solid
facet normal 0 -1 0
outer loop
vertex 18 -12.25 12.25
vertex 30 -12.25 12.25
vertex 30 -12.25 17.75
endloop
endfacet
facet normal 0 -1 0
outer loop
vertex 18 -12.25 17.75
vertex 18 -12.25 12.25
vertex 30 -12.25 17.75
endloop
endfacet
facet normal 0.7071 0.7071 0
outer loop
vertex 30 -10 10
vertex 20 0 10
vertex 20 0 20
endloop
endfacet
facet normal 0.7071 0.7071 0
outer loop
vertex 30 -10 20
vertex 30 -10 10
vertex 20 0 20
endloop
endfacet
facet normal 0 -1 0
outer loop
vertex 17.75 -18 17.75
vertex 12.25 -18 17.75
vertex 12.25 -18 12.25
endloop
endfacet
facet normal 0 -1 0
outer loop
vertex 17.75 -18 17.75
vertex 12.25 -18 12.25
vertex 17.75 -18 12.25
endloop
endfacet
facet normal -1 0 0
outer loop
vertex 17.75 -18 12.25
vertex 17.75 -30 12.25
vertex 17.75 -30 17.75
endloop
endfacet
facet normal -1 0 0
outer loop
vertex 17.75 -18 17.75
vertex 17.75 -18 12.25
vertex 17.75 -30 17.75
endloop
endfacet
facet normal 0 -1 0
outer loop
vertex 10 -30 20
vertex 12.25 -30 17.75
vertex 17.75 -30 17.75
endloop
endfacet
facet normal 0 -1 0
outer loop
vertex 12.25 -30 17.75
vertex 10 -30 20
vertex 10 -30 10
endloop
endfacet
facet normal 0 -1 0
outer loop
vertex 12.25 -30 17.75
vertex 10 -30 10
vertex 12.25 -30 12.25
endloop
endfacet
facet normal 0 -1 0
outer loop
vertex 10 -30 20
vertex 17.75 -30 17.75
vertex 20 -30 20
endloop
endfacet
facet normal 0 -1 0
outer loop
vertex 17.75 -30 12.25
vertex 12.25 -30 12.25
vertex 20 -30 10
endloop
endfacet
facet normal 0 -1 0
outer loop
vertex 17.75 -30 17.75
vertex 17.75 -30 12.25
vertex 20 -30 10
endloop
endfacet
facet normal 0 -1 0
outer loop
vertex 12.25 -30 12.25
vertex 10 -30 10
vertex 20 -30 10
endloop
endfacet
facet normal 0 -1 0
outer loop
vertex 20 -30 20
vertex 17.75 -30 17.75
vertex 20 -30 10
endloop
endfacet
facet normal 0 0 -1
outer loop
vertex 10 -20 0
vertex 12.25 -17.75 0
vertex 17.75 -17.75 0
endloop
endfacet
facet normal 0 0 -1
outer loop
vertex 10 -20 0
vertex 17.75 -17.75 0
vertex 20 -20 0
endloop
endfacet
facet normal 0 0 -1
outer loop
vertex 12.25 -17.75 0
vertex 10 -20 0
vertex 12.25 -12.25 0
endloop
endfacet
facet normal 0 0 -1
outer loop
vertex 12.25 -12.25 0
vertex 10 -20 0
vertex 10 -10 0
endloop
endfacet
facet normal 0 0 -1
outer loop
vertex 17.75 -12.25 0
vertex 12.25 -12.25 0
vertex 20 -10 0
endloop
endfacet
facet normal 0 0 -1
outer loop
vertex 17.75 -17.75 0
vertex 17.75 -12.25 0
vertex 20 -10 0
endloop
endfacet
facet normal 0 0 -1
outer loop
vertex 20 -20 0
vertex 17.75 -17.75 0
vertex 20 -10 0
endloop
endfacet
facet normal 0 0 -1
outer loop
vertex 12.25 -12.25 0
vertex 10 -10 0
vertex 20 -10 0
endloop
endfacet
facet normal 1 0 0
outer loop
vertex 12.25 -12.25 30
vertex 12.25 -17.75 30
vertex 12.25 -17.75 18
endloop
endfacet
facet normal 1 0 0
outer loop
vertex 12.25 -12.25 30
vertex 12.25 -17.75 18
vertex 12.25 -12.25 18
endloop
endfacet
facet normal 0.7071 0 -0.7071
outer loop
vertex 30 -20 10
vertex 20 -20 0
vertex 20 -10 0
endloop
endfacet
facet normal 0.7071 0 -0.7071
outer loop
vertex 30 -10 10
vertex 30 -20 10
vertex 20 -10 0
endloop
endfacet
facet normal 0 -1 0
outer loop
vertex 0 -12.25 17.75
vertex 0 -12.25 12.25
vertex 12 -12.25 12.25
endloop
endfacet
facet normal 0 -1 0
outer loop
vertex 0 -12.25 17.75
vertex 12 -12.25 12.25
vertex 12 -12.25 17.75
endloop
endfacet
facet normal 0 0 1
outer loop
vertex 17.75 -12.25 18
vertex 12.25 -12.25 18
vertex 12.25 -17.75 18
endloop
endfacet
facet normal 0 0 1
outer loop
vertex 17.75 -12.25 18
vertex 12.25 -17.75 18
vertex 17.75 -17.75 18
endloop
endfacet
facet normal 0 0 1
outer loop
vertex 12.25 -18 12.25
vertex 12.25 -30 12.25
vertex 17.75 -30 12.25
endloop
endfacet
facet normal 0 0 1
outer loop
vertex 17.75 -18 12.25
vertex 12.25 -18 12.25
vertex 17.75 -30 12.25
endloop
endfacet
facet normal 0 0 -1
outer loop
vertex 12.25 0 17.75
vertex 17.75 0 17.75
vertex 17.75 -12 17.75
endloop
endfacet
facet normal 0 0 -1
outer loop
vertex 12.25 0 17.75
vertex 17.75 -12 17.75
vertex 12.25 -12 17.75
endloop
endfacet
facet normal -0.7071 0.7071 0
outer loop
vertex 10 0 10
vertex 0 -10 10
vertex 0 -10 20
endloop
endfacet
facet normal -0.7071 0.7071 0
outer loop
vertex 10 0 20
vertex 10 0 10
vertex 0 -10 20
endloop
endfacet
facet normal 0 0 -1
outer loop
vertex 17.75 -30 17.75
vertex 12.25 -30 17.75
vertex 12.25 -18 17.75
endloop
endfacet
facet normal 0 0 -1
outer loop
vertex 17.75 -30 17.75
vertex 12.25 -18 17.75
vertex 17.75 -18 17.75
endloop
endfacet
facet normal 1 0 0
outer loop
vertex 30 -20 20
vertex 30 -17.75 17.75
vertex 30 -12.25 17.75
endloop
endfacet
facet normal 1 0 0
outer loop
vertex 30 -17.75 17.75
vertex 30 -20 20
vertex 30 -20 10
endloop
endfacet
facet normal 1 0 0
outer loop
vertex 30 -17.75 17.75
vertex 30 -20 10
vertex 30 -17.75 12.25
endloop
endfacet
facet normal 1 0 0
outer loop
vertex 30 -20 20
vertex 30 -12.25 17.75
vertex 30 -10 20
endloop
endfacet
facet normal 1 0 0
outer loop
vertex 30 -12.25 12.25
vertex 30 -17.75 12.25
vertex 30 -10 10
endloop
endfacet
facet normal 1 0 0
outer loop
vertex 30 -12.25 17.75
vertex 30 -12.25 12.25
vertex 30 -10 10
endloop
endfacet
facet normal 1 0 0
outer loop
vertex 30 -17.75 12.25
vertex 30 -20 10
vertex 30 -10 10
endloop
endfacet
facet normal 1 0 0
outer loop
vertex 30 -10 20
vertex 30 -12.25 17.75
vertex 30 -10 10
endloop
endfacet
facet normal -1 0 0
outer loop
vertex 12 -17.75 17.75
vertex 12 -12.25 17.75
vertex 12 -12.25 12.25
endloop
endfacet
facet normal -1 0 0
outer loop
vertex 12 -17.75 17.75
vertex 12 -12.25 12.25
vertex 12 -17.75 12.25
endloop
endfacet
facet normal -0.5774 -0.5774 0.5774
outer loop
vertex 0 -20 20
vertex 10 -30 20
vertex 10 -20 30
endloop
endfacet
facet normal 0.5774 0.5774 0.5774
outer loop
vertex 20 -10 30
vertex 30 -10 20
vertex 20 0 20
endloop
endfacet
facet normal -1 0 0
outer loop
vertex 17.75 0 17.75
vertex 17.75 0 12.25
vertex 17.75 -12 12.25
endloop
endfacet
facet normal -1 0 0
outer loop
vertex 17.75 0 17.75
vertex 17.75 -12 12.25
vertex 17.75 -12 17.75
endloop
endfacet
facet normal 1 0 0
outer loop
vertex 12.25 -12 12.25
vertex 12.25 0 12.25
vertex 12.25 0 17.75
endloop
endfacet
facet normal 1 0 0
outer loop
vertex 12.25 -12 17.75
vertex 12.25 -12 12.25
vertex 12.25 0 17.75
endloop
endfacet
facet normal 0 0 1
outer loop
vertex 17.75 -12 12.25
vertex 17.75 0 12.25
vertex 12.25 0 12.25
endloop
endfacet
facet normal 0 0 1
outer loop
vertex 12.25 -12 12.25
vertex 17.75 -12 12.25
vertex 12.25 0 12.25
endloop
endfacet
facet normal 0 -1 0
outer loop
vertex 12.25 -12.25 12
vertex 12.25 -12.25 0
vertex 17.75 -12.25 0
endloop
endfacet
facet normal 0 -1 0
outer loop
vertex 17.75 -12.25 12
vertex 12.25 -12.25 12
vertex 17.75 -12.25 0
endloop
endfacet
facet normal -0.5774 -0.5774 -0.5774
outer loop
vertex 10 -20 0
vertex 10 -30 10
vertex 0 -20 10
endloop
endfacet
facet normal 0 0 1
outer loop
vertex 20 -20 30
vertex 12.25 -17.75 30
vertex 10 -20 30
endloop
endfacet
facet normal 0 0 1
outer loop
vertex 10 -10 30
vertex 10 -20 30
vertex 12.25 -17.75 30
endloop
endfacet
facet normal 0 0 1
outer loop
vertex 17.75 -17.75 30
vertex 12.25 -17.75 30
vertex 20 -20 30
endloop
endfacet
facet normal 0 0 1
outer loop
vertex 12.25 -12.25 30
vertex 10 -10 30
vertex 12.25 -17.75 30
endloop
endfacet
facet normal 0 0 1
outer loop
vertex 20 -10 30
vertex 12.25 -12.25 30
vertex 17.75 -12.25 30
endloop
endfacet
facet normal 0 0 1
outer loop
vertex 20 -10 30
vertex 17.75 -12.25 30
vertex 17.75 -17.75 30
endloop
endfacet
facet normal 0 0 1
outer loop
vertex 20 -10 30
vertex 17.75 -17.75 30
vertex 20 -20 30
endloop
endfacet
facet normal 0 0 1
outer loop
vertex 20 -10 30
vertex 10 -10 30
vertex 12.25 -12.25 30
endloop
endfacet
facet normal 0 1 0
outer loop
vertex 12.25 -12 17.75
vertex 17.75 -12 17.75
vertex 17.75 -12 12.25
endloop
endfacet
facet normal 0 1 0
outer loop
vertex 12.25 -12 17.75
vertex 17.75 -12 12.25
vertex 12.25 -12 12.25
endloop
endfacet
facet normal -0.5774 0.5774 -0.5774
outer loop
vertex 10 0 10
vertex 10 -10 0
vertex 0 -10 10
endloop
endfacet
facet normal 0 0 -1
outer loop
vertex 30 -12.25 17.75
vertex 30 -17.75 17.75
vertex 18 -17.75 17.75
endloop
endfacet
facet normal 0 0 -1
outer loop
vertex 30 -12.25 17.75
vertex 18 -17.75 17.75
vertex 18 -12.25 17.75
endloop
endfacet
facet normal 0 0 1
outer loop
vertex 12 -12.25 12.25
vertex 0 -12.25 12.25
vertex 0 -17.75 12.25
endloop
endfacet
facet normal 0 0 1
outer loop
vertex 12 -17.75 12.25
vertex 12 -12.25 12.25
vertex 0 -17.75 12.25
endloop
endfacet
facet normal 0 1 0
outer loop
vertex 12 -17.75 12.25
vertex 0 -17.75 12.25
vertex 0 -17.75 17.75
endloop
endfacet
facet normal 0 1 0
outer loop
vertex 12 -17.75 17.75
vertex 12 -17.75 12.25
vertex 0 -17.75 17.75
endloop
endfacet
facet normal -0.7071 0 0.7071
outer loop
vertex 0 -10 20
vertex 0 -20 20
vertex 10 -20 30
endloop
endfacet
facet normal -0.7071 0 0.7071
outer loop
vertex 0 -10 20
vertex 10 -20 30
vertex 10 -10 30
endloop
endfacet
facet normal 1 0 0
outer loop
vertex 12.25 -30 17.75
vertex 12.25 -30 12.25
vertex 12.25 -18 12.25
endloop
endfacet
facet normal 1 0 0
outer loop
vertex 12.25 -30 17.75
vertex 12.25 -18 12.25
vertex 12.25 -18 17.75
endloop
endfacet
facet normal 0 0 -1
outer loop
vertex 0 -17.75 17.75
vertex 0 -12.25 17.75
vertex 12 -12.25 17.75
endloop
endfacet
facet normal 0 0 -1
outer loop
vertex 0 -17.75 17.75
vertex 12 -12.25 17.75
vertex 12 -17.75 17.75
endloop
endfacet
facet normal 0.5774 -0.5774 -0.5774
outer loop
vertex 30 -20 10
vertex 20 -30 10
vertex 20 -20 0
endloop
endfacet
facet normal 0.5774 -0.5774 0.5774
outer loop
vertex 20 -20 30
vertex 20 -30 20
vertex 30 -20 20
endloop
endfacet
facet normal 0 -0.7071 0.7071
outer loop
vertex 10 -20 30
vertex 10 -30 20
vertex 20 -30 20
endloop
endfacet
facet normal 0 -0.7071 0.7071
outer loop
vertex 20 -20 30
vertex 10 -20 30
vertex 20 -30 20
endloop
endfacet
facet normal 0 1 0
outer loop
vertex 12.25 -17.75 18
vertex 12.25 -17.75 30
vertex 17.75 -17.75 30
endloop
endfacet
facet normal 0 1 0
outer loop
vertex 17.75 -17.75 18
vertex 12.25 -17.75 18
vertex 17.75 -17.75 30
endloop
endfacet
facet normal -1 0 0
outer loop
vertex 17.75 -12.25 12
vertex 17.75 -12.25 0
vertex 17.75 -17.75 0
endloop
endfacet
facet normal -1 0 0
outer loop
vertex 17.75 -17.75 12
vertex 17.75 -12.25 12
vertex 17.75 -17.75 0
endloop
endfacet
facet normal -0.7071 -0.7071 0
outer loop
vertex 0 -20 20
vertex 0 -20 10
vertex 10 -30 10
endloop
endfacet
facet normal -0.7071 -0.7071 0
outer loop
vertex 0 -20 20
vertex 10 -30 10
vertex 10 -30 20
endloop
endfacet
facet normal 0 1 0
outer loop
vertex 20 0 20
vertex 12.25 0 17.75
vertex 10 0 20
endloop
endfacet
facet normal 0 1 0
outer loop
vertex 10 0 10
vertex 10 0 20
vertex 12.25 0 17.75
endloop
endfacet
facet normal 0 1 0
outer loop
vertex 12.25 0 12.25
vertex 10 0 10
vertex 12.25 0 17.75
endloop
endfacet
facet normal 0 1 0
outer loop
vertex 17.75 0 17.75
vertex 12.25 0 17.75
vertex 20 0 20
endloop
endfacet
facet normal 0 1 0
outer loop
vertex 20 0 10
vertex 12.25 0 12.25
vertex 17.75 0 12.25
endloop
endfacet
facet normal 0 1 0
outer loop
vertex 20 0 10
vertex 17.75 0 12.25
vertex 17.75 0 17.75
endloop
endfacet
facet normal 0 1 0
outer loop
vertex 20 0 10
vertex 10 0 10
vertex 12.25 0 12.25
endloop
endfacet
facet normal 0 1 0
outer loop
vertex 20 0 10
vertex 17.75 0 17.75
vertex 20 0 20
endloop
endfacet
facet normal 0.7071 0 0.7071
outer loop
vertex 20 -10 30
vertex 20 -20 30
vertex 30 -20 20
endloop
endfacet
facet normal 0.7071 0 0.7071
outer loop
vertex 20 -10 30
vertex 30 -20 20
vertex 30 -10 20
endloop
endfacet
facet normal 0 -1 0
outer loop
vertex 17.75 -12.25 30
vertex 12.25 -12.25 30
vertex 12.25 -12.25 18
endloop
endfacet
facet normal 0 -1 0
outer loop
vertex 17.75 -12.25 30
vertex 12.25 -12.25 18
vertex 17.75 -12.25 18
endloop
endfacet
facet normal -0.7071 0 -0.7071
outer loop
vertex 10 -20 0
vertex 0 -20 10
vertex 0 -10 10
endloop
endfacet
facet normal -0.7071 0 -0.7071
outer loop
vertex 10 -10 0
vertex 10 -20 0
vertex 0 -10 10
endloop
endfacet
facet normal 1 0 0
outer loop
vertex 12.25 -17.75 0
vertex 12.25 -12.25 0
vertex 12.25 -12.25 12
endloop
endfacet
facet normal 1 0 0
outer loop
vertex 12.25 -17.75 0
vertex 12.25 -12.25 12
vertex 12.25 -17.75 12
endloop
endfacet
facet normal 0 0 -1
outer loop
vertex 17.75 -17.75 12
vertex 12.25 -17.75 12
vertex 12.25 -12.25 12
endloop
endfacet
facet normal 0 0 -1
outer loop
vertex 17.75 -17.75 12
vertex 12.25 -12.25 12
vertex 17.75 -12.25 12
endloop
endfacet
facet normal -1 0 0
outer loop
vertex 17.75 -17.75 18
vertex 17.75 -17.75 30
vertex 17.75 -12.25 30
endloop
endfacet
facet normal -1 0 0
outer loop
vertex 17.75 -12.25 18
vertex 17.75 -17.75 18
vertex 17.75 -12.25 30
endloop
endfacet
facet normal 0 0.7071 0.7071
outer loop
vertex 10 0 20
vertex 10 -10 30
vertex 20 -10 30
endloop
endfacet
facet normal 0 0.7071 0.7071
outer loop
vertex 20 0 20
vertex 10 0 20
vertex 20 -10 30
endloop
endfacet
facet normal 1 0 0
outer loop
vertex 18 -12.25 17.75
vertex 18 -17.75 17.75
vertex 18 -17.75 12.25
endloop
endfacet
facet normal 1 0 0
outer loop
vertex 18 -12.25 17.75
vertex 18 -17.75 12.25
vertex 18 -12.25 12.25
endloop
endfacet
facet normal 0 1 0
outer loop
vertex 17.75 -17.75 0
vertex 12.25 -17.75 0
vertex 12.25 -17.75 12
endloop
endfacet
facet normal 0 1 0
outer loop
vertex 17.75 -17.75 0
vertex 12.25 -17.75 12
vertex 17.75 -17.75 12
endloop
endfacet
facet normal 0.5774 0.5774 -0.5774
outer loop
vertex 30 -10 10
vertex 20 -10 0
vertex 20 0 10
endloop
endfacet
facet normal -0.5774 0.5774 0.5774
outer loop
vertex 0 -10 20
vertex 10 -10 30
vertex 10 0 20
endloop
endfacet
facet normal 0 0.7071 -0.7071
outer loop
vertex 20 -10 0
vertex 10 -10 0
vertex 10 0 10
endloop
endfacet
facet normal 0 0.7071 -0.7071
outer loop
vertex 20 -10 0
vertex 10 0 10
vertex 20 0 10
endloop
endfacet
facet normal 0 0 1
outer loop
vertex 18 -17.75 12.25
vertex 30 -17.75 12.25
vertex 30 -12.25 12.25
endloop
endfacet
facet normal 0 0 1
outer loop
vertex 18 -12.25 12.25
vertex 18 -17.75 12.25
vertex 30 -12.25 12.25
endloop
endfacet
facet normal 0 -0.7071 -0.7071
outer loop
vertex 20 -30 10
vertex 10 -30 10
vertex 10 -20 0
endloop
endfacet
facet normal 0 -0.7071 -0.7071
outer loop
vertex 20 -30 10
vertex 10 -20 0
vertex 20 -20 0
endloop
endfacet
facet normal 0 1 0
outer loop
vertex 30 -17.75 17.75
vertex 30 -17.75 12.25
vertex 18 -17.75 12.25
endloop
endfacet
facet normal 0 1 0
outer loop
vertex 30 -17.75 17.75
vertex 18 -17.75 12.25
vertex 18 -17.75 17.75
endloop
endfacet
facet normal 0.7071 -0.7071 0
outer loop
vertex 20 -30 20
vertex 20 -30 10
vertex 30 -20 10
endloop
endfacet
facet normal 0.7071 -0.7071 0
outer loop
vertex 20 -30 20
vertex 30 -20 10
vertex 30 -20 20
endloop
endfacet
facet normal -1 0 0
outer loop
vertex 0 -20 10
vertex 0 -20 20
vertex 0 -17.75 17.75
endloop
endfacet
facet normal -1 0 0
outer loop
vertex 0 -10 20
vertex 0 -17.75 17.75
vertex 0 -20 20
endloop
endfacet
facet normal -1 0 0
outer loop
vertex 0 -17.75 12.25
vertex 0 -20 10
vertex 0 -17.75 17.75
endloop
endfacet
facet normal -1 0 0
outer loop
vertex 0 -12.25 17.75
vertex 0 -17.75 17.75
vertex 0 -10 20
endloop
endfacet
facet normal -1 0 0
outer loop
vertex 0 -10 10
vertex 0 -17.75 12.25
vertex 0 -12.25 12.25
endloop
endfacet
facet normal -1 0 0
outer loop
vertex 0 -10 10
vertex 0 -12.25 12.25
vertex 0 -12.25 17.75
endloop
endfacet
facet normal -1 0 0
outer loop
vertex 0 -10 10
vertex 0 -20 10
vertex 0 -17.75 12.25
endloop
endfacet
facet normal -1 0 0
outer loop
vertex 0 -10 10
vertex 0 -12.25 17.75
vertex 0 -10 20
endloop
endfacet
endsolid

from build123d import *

# Parameters (mm, degrees)
F0_W      = 30
F0_H      = 30
F1_DEPTH  = 30
F2_W      = 5.5
F2_H      = 5.5
F3_DEPTH  = 12
F4_W      = 5.5
F4_H      = 5.5
F5_DEPTH  = 12
F6_W      = 5.5
F6_H      = 5.5
F7_DEPTH  = 12
F8_W      = 5.5
F8_H      = 5.5
F9_DEPTH  = 12
F10_W     = 5.5
F10_H     = 5.5
F11_DEPTH = 12
F12_W     = 5.5
F12_H     = 5.5
F13_DEPTH = 12
F14_SIZE  = 10


with BuildPart() as f1:
    # F0 (on Top) → F1 (new body)
    with BuildSketch(Plane.XY):
        with Locations((15, -15)):
            Rectangle(F0_W, F0_H)
    extrude(amount=F1_DEPTH)

    # F2 (on face) → F3 (cut)
    with BuildSketch(Plane(origin=(0, 0, 0), x_dir=(0, -1, 0), z_dir=(-1, 0, 0))):
        with Locations((15, 15)):
            Rectangle(F2_W, F2_H)
    extrude(amount=-F3_DEPTH, mode=Mode.SUBTRACT)

    # F4 (on face) → F5 (cut)
    with BuildSketch(Plane.YZ.offset(30)):
        with Locations((-15, 15)):
            Rectangle(F4_W, F4_H)
    extrude(amount=-F5_DEPTH, mode=Mode.SUBTRACT)

    # F6 (on face) → F7 (cut)
    with BuildSketch(Plane(origin=(0, 0, 0), x_dir=(-1, 0, 0), z_dir=(0, 1, 0))):
        with Locations((-15, 15)):
            Rectangle(F6_W, F6_H)
    extrude(amount=-F7_DEPTH, mode=Mode.SUBTRACT)

    # F8 (on face) → F9 (cut)
    with BuildSketch(Plane(origin=(0, 0, 0), x_dir=(1, 0, 0), z_dir=(0, 0, -1))):
        with Locations((15, 15)):
            Rectangle(F8_W, F8_H)
    extrude(amount=-F9_DEPTH, mode=Mode.SUBTRACT)

    # F10 (on face) → F11 (cut)
    with BuildSketch(Plane.XY.offset(30)):
        with Locations((15, -15)):
            Rectangle(F10_W, F10_H)
    extrude(amount=-F11_DEPTH, mode=Mode.SUBTRACT)

    # F12 (on face) → F13 (cut)
    with BuildSketch(Plane.XZ.offset(30)):
        with Locations((15, 15)):
            Rectangle(F12_W, F12_H)
    extrude(amount=-F13_DEPTH, mode=Mode.SUBTRACT)

    # F14
    f14_edges = [f1.edges().sort_by_distance(p)[0] for p in [
        (15, -30, 0),
        (30, -30, 15),
        (15, -30, 30),
        (0, -30, 15),
        (30, -15, 0),
        (0, -15, 0),
        (15, 0, 0),
        (30, 0, 15),
        (30, -15, 30),
        (0, -15, 30),
        (15, 0, 30),
        (0, 0, 15),
    ]]
    chamfer(f14_edges, length=F14_SIZE)


solid = f1.part
